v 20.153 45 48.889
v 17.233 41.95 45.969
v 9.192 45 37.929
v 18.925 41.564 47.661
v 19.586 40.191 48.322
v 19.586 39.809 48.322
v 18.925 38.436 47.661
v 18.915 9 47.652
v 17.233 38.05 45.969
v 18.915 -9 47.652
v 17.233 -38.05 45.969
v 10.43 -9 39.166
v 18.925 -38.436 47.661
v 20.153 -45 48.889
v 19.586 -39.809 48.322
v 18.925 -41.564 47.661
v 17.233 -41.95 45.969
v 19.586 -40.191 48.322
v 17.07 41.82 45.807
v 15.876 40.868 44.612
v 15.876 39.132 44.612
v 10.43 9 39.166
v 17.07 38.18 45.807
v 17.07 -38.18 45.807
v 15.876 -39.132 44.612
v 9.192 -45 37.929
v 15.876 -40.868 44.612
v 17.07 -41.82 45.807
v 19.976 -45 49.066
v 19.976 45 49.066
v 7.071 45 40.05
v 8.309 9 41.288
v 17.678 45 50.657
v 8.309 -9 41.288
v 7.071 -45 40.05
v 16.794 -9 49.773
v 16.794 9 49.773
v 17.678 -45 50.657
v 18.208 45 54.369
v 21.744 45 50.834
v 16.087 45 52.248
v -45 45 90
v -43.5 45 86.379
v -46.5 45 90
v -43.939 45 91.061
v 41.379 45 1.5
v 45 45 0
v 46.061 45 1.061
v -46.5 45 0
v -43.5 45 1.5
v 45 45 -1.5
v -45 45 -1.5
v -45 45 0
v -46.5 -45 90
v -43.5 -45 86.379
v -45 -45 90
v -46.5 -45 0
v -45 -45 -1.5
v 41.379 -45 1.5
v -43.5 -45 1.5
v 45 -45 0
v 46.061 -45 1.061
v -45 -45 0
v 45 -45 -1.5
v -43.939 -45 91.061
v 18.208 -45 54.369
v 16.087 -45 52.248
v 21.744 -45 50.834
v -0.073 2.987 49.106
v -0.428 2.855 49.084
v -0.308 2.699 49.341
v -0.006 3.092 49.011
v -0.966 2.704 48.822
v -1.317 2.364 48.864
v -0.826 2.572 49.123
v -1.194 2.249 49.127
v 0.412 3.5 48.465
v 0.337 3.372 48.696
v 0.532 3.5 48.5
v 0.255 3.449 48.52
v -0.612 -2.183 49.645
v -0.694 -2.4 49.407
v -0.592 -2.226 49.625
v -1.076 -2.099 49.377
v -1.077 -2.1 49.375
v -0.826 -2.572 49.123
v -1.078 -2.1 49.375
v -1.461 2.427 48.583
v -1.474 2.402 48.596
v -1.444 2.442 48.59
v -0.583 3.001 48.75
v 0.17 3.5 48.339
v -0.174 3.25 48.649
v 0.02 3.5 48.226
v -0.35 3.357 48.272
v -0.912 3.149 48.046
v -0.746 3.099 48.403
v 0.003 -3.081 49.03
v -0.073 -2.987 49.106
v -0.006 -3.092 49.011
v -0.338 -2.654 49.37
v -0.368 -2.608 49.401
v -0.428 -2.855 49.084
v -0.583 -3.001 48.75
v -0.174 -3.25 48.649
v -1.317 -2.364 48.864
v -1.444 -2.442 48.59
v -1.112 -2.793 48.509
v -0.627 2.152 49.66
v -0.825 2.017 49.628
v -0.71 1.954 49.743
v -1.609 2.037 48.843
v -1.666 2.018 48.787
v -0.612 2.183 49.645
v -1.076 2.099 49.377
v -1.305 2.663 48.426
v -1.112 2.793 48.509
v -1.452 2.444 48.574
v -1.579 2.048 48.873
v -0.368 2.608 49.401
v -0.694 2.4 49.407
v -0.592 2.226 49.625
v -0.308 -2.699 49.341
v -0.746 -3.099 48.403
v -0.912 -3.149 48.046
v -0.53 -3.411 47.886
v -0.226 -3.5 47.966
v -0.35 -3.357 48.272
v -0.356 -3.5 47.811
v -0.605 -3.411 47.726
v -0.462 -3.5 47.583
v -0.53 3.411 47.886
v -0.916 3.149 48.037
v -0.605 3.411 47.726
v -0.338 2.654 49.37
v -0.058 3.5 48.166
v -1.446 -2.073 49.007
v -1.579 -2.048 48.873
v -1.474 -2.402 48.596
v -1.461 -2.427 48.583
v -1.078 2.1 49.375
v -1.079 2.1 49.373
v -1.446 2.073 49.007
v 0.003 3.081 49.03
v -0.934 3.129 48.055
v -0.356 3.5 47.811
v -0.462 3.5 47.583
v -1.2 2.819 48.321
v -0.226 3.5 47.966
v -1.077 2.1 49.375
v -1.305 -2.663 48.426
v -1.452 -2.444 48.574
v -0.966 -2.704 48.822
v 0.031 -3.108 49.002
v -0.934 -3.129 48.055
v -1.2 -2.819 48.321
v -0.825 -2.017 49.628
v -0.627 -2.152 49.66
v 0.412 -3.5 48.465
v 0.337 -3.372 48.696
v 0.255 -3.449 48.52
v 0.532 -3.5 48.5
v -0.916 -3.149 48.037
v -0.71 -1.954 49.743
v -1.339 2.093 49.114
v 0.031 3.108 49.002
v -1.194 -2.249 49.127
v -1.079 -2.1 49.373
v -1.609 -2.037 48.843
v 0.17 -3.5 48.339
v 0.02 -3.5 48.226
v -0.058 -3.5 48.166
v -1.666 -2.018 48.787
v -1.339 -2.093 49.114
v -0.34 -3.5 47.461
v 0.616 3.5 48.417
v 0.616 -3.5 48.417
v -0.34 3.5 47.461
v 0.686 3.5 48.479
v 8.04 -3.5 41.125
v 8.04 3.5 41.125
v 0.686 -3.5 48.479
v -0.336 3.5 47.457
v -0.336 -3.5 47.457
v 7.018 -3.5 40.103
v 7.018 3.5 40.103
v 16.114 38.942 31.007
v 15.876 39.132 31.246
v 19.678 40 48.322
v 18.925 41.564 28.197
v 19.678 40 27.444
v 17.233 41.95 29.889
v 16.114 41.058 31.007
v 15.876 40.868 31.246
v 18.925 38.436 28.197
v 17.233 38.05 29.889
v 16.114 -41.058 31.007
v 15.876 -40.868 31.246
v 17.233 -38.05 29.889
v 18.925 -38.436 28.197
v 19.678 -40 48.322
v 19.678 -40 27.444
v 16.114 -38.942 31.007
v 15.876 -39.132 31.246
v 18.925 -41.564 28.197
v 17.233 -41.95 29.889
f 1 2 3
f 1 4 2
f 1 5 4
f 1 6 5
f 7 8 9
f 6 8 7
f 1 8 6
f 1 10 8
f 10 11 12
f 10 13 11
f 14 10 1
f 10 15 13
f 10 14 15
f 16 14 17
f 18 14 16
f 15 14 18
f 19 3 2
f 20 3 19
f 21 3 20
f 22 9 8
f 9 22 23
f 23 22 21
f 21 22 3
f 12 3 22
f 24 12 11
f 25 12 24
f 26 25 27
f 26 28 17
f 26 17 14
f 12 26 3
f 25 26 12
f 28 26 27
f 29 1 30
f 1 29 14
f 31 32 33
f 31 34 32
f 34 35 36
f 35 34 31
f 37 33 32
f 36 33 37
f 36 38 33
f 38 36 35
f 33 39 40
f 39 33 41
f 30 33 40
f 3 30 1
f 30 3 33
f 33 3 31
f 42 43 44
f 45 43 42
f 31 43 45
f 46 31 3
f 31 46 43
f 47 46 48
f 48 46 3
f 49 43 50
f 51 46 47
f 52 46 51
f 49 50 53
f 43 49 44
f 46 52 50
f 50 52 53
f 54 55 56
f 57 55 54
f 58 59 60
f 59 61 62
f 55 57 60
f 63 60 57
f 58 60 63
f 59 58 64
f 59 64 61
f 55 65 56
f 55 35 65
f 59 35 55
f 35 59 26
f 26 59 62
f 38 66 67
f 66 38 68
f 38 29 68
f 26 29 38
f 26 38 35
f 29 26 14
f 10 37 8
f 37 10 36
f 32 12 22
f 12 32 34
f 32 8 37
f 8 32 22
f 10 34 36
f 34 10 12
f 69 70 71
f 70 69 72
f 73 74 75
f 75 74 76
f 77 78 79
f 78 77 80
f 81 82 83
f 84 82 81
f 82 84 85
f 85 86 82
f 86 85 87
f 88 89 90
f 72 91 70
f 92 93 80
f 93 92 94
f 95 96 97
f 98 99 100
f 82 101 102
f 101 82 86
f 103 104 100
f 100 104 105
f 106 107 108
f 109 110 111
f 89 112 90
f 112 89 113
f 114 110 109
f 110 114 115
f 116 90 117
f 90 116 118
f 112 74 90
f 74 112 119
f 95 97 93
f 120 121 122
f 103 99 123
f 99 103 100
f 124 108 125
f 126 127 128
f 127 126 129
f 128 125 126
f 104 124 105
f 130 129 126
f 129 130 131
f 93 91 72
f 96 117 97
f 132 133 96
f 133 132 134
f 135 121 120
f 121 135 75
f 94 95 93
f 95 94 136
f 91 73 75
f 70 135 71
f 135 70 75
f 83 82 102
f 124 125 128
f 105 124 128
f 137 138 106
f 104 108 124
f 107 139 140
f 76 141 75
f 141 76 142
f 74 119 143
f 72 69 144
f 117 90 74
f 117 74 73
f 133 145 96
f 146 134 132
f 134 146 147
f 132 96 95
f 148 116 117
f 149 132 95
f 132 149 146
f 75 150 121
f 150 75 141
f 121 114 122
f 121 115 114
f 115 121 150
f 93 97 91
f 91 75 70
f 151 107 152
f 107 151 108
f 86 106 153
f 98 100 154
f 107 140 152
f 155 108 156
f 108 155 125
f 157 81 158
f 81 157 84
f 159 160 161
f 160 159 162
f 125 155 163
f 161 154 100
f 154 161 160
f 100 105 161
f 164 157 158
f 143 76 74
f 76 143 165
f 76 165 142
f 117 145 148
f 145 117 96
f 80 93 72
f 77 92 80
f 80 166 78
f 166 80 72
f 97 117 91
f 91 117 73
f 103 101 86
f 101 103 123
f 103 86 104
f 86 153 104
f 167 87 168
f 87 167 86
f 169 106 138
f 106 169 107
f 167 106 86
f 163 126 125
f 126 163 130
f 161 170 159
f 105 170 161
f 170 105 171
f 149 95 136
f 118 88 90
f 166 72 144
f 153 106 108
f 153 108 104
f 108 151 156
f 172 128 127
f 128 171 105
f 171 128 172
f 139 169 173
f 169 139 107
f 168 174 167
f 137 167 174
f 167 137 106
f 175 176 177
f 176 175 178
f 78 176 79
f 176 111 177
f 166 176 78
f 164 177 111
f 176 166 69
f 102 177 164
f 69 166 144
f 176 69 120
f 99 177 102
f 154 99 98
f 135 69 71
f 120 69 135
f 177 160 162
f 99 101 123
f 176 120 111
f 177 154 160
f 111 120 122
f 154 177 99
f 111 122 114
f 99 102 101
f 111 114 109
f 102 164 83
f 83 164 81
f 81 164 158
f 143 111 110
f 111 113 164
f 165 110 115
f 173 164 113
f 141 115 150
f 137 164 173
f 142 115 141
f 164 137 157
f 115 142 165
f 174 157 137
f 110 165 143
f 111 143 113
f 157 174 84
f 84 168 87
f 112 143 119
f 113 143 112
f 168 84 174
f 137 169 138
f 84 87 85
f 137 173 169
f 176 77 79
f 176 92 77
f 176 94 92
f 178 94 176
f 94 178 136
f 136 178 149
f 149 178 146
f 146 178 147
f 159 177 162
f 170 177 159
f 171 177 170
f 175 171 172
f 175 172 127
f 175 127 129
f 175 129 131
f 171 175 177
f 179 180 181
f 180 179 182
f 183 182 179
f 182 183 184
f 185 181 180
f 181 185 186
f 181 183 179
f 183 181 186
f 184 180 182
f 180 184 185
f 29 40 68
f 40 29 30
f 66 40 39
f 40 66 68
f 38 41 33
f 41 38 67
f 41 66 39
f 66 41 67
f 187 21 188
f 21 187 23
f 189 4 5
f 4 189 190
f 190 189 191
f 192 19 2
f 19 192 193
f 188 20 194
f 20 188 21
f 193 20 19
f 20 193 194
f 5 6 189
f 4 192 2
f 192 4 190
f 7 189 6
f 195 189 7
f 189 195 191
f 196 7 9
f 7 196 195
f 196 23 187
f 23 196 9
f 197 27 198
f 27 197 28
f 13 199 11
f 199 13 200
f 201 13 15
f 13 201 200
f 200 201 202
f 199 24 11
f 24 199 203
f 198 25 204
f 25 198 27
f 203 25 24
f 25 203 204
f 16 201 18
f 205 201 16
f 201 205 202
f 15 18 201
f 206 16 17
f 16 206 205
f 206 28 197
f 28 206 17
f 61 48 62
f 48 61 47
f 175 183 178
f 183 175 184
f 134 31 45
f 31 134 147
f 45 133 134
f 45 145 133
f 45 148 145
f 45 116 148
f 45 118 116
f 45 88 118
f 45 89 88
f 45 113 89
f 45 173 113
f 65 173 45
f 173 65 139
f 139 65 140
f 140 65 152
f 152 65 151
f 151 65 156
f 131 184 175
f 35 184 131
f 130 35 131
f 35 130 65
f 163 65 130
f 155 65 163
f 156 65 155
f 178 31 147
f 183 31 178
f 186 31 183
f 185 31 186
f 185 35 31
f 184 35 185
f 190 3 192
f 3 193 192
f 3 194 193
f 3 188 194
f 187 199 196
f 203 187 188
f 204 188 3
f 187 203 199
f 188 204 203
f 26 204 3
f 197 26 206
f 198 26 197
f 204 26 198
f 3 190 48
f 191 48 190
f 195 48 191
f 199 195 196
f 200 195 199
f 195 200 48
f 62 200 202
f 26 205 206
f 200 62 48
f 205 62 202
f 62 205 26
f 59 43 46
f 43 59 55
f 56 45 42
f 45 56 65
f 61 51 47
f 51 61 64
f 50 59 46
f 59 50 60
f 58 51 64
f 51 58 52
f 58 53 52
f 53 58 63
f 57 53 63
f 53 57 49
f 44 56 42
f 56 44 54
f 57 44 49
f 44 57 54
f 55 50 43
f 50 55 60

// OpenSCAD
buildHeight = 90;
viewingAngle = 45;
supportAngle = 90;

//The following does not need to be edited
viewLength = buildHeight/sin(viewingAngle);
ztran = (0.5*viewLength)*sin(viewingAngle);
xtran = (0.5*viewLength)*cos(viewingAngle);
union() {
    cube([90, 90, 3], true);
    
    translate([-xtran +45,0,ztran])rotate([0, viewingAngle, 0])union(){
    cube([viewLength, 90, 3],true);
    
        translate([10,0,0]){translate([-1.25,0,18])cube([5,90,3],true);
        
    difference(){
        translate([0,0,8])cube([3,90,18],true);
        translate([0,0,9.25])cube([10,18,12],true);
        }
       translate([15, 40,0]) rotate([0,-45,0])cylinder(21,r=2,true);
       translate([15, -40,0]) rotate([0,-45,0])cylinder(21,r=2,true);
    
        
        translate([1,0,1])rotate([0,-110,0]){
            translate([3.5,0,7])rotate([0,20,0])cube([2.1,7,10.4],true);
    intersection(){
    translate([4,0,8.5])rotate([0,20,0])cube([2,7,11],true);
    difference(){
        $fn=50;{translate([5,0,10.5])sphere(3.9);}
        translate([4,0,8.5])rotate([0,20,0])cube([10,8,7.25],true);
    }
}}}
        
    }
    /*rotate([0,0,3.5]) {
translate([10,0,1.5]){scale([3,3,2]){
translate([1, -1, 0]){
difference(){
translate([-1,0,-.5])cylinder(h=1.5, r1=8, r2=8);
translate([0,1,-.5])cylinder(h=1.5, r1=7, r2=7);
}
rotate([0,0,-50])translate([-15, -1, -.5])cube([7,2.5,1.5]);
rotate([0,0,50])translate([-15, 0, -.5])cube([15,2.5,1.5]);
rotate([0,0,50])translate([-3, -2, -.5])cube([4,7,1.5]);}}}}*/
    losr = sin(180-(viewingAngle+supportAngle))/90;
    supLength = sin(viewingAngle)/losr;
    
    ztran2 = (0.5*supLength)*sin(supportAngle);
    xtran2 = (0.5*supLength)*cos(supportAngle);
    translate([xtran2 - 45,0,ztran2])rotate([0, -supportAngle, 0])cube([supLength, 90, 3],true);
    
}
